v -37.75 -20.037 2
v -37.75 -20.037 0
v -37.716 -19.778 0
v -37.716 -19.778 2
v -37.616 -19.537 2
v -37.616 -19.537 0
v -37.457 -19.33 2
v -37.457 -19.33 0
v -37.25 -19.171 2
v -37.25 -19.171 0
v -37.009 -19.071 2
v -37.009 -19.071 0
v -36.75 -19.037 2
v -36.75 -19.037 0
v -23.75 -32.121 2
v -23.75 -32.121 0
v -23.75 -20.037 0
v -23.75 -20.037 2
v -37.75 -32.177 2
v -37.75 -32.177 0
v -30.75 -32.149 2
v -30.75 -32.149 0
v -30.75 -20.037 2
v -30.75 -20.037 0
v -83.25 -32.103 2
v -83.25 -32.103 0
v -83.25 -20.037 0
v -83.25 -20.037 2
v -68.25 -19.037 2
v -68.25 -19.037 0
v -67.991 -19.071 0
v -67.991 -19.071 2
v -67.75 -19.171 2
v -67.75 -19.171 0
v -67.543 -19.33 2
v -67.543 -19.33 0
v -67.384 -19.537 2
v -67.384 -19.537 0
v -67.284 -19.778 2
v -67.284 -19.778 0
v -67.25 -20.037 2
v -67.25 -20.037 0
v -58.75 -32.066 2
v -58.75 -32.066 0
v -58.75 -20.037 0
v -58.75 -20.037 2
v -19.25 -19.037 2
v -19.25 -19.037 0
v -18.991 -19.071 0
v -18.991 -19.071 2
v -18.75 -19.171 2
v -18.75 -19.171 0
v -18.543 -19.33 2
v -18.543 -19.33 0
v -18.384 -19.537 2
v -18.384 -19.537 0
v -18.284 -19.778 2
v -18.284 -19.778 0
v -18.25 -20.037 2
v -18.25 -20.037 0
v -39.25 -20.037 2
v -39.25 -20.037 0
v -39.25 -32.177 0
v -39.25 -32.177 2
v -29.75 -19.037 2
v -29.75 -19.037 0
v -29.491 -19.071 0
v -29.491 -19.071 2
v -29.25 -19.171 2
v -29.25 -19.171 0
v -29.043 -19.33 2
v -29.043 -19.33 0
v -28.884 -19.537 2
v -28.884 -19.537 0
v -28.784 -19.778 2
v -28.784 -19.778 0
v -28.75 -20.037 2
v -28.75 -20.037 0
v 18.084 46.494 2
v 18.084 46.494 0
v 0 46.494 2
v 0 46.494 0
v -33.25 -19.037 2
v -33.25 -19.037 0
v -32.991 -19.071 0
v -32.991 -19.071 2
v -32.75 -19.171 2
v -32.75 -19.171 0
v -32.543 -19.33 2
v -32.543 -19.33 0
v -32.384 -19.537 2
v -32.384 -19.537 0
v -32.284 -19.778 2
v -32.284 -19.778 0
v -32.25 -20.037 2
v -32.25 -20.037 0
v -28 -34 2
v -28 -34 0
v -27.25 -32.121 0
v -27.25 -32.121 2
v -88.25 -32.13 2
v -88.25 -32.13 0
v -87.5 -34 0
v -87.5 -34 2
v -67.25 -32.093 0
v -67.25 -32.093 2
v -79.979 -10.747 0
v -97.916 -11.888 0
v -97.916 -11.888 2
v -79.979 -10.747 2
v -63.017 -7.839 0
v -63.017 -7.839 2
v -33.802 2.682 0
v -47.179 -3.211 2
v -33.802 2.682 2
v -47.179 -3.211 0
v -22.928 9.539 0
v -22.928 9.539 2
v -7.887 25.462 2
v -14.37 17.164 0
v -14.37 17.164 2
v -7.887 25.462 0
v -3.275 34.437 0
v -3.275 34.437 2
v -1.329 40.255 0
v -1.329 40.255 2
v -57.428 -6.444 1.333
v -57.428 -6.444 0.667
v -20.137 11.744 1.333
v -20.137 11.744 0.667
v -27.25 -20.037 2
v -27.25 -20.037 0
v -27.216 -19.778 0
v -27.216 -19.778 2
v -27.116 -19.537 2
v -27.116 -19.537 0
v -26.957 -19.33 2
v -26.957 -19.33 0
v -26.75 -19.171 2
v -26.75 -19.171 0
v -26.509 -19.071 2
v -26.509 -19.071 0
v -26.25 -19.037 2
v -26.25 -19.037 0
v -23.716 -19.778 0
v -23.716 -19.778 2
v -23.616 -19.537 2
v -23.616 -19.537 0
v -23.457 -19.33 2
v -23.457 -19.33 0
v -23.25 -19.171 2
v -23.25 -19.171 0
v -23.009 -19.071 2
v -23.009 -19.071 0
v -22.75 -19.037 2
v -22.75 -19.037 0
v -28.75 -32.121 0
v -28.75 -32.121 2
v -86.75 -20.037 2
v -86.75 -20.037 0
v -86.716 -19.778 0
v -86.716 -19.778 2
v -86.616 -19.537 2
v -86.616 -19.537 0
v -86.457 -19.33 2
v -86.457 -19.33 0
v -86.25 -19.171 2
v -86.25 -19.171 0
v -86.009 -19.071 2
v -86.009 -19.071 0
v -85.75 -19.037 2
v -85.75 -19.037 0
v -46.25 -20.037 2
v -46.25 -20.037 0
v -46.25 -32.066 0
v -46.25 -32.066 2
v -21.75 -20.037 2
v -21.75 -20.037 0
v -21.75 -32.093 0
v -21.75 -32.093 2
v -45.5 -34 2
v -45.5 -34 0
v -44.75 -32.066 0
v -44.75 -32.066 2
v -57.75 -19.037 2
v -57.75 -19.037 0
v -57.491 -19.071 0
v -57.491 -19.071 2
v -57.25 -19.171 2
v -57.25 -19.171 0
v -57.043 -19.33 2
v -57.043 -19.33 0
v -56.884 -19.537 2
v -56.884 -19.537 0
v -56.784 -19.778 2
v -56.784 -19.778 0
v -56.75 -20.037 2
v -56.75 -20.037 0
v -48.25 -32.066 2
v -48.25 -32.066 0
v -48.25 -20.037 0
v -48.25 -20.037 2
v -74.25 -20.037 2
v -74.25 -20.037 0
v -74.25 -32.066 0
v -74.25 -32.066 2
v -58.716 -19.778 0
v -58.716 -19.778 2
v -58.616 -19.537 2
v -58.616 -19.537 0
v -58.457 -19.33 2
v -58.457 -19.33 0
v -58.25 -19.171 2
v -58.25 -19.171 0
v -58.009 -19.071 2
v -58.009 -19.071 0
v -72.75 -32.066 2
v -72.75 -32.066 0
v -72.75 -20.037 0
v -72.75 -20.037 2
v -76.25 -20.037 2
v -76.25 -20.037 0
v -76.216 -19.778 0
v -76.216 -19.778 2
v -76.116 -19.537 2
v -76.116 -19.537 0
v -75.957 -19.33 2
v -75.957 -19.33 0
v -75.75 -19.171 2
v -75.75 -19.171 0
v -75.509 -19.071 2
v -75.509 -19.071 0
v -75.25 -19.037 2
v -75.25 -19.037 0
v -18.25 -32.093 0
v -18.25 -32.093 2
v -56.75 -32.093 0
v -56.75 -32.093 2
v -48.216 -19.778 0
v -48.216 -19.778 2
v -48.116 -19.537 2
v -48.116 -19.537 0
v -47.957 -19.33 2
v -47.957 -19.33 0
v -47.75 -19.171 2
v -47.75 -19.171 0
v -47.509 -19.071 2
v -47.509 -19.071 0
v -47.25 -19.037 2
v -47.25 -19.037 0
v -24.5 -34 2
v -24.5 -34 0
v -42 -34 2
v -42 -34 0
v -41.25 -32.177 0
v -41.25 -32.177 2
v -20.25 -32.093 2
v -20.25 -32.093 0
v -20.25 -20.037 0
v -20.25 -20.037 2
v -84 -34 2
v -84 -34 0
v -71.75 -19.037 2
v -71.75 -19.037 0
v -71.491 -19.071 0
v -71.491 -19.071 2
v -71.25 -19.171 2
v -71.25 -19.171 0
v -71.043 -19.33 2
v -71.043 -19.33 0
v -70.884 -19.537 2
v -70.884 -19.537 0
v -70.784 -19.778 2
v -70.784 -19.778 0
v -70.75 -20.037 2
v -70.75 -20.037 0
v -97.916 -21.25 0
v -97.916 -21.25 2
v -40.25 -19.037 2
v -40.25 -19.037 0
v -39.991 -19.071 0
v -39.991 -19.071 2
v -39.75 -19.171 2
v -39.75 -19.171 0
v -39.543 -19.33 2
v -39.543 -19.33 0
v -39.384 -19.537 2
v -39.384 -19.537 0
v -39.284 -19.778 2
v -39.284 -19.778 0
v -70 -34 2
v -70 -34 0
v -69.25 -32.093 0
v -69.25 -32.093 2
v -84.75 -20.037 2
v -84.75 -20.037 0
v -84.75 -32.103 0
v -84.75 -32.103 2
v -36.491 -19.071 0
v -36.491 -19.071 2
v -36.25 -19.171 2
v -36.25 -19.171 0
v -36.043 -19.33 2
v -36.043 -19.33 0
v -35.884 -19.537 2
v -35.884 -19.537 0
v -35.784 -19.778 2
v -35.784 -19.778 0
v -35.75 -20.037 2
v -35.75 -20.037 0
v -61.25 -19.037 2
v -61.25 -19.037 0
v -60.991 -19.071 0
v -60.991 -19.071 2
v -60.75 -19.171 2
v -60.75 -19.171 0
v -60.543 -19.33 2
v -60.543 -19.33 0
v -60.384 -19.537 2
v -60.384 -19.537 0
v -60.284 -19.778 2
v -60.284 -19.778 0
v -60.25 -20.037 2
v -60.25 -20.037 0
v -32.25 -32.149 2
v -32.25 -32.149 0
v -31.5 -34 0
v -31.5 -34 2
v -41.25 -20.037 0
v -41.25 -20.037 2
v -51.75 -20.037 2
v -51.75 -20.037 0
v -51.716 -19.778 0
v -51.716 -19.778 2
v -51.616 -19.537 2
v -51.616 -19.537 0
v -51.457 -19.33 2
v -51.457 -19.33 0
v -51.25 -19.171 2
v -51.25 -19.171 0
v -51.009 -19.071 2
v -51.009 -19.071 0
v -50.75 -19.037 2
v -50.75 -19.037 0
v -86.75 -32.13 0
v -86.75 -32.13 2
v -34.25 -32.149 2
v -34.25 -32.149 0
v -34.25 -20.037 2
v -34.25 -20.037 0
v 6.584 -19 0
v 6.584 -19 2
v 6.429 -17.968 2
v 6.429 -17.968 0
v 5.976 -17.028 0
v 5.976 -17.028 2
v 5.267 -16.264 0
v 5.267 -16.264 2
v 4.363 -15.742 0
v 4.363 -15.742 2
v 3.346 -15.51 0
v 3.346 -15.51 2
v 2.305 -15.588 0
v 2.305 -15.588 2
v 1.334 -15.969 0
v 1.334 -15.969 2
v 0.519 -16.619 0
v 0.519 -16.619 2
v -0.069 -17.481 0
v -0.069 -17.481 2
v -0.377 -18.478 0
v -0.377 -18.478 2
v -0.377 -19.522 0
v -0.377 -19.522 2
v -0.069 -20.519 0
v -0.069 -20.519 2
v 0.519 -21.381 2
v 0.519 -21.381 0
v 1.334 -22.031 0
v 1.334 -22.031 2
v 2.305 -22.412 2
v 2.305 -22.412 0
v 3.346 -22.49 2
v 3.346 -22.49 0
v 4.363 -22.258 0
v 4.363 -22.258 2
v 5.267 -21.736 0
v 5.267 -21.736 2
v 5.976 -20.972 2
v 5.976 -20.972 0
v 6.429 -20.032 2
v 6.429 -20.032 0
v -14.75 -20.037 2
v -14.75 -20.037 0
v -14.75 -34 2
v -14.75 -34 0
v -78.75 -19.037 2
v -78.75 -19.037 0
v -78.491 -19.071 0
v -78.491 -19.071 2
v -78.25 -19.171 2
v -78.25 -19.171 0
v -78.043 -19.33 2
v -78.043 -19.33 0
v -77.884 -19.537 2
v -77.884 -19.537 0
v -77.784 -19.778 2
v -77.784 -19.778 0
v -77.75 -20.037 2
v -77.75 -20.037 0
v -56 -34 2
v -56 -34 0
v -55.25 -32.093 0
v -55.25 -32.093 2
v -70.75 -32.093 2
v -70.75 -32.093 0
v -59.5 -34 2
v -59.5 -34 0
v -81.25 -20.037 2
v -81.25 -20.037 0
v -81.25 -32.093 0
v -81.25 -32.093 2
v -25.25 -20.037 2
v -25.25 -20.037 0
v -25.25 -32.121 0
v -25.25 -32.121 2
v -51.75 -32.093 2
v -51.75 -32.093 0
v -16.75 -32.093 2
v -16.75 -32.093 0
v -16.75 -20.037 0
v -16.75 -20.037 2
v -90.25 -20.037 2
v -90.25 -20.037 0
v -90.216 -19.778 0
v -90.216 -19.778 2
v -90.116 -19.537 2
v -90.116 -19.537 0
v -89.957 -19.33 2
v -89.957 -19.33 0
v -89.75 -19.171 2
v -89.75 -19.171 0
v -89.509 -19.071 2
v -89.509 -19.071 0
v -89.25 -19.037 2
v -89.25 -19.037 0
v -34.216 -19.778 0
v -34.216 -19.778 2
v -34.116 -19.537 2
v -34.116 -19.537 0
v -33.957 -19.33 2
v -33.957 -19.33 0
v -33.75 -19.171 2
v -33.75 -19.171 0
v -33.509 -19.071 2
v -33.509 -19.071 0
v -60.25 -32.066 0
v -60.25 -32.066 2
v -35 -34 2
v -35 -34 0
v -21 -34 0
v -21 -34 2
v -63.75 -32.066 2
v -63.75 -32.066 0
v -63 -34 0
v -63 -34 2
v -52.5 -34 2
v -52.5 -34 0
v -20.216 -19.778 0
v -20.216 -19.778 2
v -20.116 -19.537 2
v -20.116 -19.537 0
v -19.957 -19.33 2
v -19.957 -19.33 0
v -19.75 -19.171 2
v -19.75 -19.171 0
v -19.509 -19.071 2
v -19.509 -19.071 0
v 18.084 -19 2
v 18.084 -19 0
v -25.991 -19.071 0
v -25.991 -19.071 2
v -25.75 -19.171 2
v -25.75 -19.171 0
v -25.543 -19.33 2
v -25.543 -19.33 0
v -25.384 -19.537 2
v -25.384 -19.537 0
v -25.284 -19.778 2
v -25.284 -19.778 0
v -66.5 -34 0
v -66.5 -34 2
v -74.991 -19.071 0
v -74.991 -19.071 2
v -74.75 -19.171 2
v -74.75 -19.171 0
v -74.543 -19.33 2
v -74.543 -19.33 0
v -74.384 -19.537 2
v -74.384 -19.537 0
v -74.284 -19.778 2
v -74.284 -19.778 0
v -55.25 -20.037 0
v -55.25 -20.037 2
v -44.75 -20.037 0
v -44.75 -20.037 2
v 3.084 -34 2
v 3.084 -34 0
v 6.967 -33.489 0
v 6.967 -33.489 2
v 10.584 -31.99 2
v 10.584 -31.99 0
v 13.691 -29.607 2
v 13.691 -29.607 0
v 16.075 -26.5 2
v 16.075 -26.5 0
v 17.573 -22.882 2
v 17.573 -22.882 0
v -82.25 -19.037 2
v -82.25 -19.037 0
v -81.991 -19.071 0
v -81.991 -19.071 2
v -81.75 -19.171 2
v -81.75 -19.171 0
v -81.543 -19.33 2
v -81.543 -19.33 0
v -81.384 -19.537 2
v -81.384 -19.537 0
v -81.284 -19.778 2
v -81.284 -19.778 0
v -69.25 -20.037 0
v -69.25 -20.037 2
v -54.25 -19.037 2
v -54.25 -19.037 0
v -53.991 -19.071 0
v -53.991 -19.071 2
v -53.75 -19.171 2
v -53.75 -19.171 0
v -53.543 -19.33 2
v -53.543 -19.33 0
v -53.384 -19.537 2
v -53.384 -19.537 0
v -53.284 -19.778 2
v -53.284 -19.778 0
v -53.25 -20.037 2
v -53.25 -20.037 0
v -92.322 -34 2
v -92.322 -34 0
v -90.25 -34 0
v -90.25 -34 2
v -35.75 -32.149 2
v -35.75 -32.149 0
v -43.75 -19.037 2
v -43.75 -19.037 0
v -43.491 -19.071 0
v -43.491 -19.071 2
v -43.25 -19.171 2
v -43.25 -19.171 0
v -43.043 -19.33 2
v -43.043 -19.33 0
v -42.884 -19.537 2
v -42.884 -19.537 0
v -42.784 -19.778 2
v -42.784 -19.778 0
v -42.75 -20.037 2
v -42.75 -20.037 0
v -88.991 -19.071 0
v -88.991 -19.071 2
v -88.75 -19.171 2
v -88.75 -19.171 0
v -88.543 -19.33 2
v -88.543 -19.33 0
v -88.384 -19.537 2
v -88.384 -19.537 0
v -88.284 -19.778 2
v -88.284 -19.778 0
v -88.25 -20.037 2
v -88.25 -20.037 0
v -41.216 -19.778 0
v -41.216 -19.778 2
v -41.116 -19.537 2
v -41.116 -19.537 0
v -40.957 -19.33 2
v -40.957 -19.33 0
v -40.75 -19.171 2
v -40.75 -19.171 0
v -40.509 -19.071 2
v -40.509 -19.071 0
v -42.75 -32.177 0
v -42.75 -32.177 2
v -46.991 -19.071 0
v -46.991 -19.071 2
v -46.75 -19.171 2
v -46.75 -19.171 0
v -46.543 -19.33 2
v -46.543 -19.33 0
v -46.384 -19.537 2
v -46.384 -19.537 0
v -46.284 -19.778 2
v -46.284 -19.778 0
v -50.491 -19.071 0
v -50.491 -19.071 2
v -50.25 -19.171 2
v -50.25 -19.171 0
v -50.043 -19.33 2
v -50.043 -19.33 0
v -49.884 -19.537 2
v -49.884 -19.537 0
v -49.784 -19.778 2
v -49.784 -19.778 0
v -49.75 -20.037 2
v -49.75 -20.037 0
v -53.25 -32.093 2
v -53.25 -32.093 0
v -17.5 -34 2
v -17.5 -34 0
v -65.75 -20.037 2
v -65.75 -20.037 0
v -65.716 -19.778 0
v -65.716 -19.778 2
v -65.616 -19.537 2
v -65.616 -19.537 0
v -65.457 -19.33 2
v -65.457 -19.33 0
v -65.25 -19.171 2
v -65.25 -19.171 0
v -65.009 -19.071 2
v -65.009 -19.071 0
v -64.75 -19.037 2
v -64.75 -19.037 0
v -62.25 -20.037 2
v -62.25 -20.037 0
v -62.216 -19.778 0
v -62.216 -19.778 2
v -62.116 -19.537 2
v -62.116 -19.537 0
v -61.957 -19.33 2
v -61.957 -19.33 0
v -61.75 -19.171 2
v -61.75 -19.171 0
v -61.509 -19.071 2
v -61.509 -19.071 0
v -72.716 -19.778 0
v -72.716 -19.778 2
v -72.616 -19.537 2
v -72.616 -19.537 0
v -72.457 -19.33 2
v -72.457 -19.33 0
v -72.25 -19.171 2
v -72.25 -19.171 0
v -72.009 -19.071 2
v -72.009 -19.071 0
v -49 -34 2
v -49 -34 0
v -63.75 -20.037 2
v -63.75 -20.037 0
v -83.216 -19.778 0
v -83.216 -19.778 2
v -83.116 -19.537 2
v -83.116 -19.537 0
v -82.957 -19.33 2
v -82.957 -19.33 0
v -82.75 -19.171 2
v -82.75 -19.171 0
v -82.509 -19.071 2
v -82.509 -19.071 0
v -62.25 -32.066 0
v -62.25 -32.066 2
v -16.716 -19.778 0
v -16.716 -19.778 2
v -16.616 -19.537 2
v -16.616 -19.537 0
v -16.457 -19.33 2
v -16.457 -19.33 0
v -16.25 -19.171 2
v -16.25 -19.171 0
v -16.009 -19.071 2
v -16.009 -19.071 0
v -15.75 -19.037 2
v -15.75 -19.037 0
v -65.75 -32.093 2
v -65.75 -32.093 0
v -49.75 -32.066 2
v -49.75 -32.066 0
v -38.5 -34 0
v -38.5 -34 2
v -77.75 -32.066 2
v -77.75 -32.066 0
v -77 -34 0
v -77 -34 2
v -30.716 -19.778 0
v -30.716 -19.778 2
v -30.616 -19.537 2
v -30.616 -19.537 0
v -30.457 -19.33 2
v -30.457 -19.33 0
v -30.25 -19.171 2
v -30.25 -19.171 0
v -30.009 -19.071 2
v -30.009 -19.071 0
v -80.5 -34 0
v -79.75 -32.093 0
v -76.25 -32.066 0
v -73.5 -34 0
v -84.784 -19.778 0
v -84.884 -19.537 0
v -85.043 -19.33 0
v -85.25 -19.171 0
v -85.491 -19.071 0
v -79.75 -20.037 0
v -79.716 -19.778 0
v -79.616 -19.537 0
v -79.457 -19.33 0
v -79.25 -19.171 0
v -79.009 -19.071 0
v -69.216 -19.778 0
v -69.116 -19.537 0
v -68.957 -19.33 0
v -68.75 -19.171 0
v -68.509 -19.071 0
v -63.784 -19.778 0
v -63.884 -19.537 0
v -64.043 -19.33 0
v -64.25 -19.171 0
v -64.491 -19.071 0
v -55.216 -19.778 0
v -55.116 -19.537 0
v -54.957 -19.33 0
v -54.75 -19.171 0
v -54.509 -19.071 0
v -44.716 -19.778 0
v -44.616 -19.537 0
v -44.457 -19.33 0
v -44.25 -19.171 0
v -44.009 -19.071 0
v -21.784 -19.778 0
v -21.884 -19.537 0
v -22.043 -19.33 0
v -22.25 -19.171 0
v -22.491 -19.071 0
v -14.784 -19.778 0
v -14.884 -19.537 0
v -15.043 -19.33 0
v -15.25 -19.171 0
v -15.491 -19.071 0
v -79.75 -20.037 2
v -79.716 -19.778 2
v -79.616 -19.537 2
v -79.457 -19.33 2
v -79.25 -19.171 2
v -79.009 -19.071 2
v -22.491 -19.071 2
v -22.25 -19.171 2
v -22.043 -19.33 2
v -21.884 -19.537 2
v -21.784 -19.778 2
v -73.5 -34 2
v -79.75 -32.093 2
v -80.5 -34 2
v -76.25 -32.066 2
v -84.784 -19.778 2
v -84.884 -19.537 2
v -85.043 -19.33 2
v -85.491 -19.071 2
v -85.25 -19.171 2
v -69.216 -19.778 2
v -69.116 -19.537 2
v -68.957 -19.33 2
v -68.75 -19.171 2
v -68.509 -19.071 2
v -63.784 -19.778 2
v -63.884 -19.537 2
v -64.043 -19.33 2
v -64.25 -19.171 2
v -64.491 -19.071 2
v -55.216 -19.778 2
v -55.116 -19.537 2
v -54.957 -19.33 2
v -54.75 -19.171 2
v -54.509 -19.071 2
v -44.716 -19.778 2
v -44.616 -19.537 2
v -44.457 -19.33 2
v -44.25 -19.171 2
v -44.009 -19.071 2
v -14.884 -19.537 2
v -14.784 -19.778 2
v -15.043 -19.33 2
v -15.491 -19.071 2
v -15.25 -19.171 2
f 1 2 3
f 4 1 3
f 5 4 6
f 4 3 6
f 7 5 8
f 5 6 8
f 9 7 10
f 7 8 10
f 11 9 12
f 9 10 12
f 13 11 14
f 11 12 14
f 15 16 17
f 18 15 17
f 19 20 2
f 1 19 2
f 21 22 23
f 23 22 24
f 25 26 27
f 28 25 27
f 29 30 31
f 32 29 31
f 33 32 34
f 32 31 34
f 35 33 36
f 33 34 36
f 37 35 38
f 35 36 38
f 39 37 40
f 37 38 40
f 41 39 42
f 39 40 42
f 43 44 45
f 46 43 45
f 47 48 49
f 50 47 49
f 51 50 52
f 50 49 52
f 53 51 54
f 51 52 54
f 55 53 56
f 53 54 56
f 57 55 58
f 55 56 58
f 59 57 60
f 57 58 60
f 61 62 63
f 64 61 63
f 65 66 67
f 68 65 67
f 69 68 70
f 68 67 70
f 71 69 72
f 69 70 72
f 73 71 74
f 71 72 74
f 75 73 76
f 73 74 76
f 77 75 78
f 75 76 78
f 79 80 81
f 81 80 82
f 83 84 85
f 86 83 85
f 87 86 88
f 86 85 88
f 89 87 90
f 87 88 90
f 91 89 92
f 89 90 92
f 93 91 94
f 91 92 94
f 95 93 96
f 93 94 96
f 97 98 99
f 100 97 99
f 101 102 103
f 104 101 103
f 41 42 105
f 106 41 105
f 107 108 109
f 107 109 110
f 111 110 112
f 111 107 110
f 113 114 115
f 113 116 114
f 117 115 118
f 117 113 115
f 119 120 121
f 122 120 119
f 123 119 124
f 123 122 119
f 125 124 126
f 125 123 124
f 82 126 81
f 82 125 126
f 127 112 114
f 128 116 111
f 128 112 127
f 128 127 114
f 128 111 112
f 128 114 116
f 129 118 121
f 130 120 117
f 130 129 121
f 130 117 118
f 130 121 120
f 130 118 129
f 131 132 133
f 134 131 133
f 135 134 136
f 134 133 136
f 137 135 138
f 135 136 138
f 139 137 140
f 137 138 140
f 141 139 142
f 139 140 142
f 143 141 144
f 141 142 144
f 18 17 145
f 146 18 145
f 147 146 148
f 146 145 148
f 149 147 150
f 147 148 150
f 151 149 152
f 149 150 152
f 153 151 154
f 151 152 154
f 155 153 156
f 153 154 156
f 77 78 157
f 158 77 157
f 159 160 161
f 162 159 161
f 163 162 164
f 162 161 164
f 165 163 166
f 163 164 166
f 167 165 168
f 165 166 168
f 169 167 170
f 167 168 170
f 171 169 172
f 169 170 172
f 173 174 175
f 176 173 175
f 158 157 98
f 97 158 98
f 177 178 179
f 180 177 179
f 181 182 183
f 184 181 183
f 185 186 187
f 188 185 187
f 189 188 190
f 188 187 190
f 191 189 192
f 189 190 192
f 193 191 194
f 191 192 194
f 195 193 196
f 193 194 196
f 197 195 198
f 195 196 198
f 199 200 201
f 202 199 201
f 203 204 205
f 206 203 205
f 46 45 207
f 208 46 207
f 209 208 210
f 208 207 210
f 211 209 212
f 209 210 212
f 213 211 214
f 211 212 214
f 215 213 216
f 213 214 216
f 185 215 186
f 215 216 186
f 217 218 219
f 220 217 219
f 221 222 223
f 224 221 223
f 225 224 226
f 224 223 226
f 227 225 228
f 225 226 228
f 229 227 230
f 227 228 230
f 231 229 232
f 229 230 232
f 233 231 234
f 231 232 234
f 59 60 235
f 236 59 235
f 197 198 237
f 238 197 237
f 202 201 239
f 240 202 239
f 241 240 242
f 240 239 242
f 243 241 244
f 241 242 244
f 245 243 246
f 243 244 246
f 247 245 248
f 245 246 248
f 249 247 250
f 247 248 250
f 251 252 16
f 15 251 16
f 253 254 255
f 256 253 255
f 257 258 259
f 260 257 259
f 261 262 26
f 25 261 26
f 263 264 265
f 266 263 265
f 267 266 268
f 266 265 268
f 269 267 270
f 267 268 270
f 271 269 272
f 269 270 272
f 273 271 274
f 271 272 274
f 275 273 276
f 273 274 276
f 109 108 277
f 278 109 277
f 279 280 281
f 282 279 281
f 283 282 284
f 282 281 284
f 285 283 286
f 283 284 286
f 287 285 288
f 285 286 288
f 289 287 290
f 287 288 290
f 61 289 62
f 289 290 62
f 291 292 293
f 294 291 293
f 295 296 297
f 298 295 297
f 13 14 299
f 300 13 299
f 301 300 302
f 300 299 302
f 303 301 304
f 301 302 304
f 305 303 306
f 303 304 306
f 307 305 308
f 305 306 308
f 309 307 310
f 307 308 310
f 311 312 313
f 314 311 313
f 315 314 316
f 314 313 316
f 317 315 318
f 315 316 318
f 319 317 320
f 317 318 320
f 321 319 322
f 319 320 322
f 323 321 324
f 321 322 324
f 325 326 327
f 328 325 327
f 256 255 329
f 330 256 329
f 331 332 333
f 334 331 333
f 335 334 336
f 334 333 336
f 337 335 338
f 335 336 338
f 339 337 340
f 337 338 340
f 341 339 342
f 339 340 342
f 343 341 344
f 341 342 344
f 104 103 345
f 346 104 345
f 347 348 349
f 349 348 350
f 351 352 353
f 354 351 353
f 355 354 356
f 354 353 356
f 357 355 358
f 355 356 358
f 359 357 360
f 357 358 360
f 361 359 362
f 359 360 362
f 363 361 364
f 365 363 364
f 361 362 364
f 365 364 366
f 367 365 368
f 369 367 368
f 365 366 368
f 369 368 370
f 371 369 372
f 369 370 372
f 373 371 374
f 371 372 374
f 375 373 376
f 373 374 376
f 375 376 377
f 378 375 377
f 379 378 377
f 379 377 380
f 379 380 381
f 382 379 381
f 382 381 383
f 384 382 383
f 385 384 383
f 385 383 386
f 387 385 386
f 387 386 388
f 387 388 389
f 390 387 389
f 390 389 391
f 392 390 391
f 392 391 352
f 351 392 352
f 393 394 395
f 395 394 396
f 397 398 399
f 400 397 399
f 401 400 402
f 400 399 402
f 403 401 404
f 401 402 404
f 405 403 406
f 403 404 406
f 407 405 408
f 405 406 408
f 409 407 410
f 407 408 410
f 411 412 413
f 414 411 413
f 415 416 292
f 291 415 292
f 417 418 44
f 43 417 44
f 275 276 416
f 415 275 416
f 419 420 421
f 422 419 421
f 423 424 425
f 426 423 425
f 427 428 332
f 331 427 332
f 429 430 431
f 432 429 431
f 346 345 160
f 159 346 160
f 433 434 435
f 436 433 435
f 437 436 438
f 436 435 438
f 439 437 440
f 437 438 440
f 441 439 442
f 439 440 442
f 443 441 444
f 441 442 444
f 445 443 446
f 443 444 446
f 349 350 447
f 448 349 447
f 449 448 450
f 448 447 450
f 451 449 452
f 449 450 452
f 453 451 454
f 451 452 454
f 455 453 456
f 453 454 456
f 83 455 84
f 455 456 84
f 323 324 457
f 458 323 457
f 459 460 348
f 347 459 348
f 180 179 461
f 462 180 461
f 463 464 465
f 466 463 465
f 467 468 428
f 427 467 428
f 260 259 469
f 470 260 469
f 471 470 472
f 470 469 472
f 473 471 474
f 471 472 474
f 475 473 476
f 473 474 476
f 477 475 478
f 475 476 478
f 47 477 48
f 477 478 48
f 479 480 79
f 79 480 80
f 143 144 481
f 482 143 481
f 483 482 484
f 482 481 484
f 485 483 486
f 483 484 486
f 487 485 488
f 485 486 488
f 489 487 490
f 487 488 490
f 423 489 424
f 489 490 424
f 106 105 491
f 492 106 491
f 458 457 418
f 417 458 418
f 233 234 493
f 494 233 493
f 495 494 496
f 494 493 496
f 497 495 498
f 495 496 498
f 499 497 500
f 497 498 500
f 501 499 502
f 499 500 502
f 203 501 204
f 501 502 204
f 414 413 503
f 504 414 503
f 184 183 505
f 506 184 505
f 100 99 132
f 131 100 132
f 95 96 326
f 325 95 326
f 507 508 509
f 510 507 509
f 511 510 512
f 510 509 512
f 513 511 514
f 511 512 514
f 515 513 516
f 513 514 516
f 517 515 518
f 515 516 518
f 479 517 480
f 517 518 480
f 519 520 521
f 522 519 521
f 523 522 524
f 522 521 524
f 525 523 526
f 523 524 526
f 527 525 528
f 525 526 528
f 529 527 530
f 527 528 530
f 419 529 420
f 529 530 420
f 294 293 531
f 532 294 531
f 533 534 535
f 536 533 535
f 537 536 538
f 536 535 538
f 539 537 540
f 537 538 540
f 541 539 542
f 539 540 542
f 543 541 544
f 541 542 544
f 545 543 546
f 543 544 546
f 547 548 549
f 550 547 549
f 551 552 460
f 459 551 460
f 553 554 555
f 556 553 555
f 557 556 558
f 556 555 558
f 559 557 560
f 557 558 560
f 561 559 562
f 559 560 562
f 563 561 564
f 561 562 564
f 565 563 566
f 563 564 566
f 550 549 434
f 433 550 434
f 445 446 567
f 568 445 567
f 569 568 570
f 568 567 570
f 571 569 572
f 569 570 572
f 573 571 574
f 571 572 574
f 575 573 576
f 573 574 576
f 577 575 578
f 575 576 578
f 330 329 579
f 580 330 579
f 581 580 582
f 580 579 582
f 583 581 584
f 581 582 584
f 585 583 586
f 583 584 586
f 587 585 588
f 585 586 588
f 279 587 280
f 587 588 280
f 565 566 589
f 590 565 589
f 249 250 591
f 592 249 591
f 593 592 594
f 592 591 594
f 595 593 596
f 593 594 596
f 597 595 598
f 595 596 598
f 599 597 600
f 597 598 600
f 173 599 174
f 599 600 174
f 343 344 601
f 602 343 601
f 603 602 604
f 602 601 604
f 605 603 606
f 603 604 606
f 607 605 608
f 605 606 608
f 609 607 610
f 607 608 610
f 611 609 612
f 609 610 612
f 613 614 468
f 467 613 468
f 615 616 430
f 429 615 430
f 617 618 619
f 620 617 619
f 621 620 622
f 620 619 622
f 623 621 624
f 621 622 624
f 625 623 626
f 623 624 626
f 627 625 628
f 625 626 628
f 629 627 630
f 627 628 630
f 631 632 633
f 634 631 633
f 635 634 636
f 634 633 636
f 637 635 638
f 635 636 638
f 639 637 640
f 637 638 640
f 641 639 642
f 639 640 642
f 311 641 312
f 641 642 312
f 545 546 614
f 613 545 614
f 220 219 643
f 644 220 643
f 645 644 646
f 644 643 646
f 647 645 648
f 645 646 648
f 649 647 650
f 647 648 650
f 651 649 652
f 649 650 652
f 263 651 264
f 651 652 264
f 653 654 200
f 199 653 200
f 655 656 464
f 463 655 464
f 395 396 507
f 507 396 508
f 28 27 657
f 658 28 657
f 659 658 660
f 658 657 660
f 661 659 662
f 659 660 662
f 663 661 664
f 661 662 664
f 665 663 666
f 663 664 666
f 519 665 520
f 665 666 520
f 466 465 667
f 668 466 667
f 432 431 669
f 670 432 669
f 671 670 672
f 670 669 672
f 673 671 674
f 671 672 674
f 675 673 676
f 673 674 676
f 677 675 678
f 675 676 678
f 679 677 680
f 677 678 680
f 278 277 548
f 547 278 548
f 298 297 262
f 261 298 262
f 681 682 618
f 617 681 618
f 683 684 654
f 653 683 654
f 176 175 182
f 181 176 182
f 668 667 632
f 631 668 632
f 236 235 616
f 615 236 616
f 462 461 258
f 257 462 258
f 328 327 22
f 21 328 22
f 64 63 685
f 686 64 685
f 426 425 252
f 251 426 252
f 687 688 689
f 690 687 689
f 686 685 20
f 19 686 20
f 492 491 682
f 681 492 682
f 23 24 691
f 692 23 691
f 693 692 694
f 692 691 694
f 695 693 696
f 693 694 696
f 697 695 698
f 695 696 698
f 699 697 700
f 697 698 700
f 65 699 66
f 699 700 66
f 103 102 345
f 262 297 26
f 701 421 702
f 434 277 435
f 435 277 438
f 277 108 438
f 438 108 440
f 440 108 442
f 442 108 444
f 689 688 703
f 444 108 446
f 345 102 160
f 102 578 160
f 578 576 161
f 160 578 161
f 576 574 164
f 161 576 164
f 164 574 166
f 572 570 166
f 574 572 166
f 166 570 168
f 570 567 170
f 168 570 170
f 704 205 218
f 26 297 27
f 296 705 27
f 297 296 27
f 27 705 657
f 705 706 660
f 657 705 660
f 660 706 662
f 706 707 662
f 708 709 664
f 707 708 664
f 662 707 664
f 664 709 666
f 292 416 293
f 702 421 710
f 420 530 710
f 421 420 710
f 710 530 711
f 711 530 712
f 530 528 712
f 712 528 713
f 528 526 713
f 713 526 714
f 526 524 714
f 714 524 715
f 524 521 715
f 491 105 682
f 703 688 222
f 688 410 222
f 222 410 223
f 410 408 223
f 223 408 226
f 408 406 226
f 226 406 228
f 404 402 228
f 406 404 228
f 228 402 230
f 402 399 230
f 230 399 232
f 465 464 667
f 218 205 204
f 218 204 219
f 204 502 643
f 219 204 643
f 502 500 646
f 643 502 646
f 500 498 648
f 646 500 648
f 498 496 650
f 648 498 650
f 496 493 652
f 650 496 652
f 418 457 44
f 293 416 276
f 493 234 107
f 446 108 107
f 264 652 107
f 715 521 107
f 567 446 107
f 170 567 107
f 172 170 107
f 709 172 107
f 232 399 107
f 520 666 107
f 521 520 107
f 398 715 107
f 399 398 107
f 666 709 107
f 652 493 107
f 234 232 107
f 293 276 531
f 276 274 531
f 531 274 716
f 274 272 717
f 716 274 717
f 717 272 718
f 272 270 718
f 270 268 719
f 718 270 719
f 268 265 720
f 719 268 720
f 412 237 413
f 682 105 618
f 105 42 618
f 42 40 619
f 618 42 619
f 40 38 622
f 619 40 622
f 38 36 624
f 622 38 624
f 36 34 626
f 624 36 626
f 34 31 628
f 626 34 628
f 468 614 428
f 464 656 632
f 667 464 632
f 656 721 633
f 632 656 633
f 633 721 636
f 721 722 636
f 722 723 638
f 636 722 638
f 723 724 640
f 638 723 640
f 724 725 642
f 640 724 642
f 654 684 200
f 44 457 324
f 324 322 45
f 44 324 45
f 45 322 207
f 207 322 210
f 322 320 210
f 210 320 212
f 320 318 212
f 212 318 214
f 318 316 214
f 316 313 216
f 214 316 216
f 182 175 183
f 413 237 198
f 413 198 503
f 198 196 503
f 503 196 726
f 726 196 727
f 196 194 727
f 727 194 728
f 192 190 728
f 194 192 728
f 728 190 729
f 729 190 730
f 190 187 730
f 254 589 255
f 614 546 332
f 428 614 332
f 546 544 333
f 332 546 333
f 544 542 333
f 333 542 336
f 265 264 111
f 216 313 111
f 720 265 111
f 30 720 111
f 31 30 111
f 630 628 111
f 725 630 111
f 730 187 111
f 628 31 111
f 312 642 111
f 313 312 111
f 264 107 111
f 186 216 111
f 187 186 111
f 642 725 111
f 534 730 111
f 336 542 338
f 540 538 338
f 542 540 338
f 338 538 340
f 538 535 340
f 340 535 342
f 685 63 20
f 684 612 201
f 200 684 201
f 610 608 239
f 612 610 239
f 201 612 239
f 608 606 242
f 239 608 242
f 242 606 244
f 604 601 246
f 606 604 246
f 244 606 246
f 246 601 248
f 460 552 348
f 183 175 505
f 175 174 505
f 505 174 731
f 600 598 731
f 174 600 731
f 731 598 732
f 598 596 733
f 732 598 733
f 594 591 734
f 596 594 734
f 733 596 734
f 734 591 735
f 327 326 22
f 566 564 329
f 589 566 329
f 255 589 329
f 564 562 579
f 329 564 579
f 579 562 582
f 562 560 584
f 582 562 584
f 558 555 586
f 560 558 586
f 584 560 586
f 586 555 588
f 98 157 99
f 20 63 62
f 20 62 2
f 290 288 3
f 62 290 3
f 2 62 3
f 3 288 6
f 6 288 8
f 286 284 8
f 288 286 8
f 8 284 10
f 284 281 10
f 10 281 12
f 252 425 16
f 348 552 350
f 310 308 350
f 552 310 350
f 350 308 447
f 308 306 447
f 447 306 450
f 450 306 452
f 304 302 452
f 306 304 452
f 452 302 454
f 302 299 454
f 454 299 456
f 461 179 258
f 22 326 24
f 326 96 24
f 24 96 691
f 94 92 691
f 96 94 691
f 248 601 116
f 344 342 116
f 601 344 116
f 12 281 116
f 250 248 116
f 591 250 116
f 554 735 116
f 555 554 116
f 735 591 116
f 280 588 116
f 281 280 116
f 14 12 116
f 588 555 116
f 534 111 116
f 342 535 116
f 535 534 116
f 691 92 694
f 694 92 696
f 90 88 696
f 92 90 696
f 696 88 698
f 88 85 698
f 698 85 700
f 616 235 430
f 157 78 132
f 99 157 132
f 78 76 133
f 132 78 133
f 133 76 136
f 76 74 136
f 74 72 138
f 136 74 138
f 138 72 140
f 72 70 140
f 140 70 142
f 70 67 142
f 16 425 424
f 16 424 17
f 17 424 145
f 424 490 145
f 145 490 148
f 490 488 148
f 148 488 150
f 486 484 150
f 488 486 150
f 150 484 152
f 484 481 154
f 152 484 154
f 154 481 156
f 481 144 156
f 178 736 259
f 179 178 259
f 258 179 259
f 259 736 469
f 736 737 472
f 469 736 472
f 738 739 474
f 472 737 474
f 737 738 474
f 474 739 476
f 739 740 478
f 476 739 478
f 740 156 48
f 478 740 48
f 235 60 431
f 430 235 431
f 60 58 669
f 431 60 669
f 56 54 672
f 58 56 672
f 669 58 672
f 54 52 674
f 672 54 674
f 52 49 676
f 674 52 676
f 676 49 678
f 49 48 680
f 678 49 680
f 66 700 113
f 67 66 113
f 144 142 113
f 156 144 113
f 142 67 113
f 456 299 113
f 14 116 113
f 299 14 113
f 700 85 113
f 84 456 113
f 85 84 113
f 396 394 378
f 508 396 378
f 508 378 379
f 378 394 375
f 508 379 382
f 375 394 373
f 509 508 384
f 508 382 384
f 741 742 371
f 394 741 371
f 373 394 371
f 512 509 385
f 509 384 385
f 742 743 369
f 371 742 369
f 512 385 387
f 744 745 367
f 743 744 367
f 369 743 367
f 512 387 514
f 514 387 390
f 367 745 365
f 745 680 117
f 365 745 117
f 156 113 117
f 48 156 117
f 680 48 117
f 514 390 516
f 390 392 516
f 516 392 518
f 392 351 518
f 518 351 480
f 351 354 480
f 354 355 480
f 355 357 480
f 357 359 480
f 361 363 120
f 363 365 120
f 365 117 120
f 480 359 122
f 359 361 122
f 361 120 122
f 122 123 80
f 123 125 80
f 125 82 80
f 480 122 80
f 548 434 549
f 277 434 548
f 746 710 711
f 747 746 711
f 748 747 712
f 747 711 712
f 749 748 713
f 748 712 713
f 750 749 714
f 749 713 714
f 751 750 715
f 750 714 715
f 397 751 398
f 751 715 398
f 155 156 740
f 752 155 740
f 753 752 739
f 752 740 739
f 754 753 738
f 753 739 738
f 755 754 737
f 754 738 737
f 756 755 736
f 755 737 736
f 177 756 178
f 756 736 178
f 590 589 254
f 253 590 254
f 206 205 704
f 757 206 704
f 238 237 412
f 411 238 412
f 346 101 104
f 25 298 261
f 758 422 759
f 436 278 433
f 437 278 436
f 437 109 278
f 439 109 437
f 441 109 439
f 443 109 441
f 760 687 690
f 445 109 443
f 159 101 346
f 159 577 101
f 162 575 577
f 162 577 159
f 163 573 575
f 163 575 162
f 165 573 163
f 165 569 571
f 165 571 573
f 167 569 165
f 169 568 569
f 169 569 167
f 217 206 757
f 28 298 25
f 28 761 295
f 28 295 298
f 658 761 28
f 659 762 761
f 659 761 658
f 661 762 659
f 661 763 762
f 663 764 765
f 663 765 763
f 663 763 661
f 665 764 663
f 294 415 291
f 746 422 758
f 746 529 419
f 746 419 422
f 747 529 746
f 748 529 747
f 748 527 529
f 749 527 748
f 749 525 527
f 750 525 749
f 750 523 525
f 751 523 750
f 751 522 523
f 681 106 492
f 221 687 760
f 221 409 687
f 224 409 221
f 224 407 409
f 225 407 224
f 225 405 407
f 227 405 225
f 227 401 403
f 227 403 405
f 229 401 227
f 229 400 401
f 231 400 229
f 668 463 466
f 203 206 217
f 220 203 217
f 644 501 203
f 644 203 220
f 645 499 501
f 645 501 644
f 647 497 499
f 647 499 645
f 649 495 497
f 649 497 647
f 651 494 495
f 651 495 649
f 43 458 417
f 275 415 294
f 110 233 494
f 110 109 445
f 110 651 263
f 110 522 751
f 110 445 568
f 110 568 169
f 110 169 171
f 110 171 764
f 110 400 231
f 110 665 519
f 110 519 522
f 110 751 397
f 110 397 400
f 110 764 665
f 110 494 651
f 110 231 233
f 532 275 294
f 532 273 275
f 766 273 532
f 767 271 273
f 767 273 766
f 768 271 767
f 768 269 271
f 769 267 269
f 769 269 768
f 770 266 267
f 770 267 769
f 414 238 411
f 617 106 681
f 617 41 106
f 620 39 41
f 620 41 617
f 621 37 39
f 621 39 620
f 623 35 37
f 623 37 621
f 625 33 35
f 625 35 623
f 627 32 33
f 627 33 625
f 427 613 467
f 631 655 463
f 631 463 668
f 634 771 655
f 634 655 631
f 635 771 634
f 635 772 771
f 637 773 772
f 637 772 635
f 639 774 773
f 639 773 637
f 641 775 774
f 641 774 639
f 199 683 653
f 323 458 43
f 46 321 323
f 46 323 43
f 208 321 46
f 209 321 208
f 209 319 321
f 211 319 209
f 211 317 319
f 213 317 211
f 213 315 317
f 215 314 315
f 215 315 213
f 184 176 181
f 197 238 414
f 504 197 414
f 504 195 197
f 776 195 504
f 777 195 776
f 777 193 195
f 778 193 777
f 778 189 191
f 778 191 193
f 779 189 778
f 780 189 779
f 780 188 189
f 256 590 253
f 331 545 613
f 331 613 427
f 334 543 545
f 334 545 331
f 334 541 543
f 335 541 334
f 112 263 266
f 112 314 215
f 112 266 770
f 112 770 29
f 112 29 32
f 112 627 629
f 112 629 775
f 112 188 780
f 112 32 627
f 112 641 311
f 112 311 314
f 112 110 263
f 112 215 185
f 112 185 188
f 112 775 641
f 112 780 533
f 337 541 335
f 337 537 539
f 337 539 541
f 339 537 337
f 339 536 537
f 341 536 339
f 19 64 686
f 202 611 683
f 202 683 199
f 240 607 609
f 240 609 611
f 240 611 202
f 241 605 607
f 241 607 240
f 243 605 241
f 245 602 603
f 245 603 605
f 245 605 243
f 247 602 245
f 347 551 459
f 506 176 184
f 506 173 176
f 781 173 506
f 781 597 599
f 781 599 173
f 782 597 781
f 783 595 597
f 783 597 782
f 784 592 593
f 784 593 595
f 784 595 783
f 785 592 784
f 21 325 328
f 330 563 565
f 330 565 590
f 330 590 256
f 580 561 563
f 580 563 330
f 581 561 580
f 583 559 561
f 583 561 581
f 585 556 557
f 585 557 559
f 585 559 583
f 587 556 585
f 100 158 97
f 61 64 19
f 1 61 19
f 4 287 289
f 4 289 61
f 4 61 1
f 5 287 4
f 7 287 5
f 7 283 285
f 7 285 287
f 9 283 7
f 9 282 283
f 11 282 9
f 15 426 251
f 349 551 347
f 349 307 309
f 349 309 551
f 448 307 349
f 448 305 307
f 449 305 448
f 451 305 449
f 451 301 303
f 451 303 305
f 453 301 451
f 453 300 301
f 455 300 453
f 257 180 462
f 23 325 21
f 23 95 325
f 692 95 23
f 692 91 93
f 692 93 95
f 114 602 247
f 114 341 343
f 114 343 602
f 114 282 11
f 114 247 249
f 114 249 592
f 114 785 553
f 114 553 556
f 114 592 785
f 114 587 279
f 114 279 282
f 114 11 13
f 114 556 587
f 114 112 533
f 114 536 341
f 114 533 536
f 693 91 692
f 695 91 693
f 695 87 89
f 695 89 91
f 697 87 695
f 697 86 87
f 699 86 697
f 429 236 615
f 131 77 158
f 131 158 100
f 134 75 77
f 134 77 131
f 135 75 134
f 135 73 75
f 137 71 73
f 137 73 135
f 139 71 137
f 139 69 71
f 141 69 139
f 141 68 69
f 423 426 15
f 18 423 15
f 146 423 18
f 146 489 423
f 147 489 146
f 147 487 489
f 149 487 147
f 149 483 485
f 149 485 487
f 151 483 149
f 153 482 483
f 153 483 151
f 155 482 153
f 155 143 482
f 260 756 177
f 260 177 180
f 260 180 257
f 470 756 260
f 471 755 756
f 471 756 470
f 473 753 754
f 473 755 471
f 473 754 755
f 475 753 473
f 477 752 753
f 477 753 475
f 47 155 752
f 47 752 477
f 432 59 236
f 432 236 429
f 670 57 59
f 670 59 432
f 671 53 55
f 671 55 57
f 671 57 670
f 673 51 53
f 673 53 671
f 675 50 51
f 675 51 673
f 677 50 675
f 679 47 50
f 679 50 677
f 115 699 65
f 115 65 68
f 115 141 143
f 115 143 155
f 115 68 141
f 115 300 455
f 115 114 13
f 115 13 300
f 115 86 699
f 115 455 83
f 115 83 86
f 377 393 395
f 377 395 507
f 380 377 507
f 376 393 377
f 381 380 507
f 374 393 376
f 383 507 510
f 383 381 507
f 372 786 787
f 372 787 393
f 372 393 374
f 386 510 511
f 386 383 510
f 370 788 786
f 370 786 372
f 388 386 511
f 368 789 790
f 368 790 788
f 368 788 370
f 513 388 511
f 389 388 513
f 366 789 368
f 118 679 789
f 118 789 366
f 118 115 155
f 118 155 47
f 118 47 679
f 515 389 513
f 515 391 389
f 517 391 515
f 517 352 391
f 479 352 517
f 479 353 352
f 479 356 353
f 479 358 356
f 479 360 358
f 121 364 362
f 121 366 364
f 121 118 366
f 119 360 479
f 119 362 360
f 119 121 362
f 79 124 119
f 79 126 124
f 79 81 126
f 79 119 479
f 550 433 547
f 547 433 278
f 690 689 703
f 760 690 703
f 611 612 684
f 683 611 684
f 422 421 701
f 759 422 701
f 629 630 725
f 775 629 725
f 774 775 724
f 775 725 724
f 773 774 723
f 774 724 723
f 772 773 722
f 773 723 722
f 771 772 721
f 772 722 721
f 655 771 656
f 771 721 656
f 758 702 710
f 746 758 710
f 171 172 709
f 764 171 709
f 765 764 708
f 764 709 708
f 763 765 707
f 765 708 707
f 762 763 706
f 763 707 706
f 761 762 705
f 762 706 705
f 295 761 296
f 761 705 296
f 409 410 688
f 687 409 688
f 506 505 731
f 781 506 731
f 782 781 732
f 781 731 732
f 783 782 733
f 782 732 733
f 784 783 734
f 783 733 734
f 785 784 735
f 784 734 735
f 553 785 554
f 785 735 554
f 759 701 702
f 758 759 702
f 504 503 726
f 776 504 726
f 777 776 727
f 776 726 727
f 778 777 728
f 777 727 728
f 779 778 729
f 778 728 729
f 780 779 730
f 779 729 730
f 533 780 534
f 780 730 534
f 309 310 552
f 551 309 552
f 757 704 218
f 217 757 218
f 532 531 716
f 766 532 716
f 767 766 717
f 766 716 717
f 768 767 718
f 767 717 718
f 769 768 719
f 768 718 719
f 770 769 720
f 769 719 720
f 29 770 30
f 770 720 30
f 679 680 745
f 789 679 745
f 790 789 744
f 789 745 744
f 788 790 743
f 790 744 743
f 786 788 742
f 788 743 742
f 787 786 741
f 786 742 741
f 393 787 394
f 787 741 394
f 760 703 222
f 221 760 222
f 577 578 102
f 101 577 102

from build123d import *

# Parameters (mm, degrees)
F1_DEPTH = 2
F2_R     = 3.5
F3_DEPTH = 25


# Not quite as in the source:
# - a feature names something its author has since deleted; it is built from what else it names


with BuildPart() as f1:
    # F0 (on Top) → F1 (new body)
    with BuildSketch(Plane.XY):
        with BuildLine():
            ThreePointArc((-15.75, -19.0369902551), (-15.0428932188, -19.3298834739), (-14.75, -20.0369902551))
            Line((-14.75, -20.0369902551), (-14.75, -34))
            Line((-14.75, -34), (3.0843058825, -34))
            ThreePointArc((3.0843058825, -34), (13.6909076003, -29.6066017178), (18.0843058825, -19))
            Line((18.0843058825, -19), (18.0843058825, 46.4938916266))
            Line((18.0843058825, 46.4938916266), (0, 46.4938916266))
            add(Edge.make_bspline(
                [(-97.9156941175, -11.8882479146), (-60.4824349284, -11.5448236465), (-6.9082397968, 2.1921501029), (0, 46.4938916266)],
                knots=[0, 0, 0, 0, 113.9998130346, 113.9998130346, 113.9998130346, 113.9998130346], degree=3))
            Line((-97.9156941175, -11.8882479146), (-97.9156941175, -21.2501913908))
            Line((-97.9156941175, -21.2501913908), (-92.3223271966, -34))
            Line((-92.3223271966, -34), (-90.25, -34))
            Line((-90.25, -34), (-90.25, -32.1302767694))
            Line((-90.25, -32.1302767694), (-90.25, -20.0369902551))
            ThreePointArc((-90.25, -20.0369902551), (-89.9571067812, -19.3298834739), (-89.25, -19.0369902551))
            ThreePointArc((-89.25, -19.0369902551), (-88.5428932188, -19.3298834739), (-88.25, -20.0369902551))
            Line((-88.25, -20.0369902551), (-88.25, -32.1302767694))
            Line((-88.25, -32.1302767694), (-87.5, -34))
            Line((-87.5, -34), (-86.75, -32.1302767694))
            Line((-86.75, -32.1302767694), (-86.75, -20.0369902551))
            ThreePointArc((-86.75, -20.0369902551), (-86.4571067812, -19.3298834739), (-85.75, -19.0369902551))
            ThreePointArc((-85.75, -19.0369902551), (-85.0428932188, -19.3298834739), (-84.75, -20.0369902551))
            Line((-84.75, -20.0369902551), (-84.75, -32.1025866866))
            Line((-84.75, -32.1025866866), (-84, -34))
            Line((-84, -34), (-83.25, -32.1025866866))
            Line((-83.25, -32.1025866866), (-83.25, -20.0369902551))
            ThreePointArc((-83.25, -20.0369902551), (-82.9571067812, -19.3298834739), (-82.25, -19.0369902551))
            ThreePointArc((-82.25, -19.0369902551), (-81.5428932188, -19.3298834739), (-81.25, -20.0369902551))
            Line((-81.25, -20.0369902551), (-81.25, -32.0932865143))
            Line((-81.25, -32.0932865143), (-80.5, -34))
            Line((-80.5, -34), (-79.75, -32.0932865143))
            Line((-79.75, -32.0932865143), (-79.75, -20.0369902551))
            ThreePointArc((-79.75, -20.0369902551), (-79.4571067812, -19.3298834739), (-78.75, -19.0369902551))
            ThreePointArc((-78.75, -19.0369902551), (-78.0428932188, -19.3298834739), (-77.75, -20.0369902551))
            Line((-77.75, -20.0369902551), (-77.75, -32.0655964315))
            Line((-77.75, -32.0655964315), (-77, -34))
            Line((-77, -34), (-76.25, -32.0655964315))
            Line((-76.25, -32.0655964315), (-76.25, -20.0369902551))
            ThreePointArc((-76.25, -20.0369902551), (-75.9571067812, -19.3298834739), (-75.25, -19.0369902551))
            ThreePointArc((-75.25, -19.0369902551), (-74.5428932188, -19.3298834739), (-74.25, -20.0369902551))
            Line((-74.25, -20.0369902551), (-74.25, -32.0655964315))
            Line((-74.25, -32.0655964315), (-73.5, -34))
            Line((-73.5, -34), (-72.75, -32.0655964315))
            Line((-72.75, -32.0655964315), (-72.75, -20.0369902551))
            ThreePointArc((-72.75, -20.0369902551), (-72.4571067812, -19.3298834739), (-71.75, -19.0369902551))
            ThreePointArc((-71.75, -19.0369902551), (-71.0428932188, -19.3298834739), (-70.75, -20.0369902551))
            Line((-70.75, -20.0369902551), (-70.75, -32.0932865143))
            Line((-70.75, -32.0932865143), (-70, -34))
            Line((-70, -34), (-69.25, -32.0932865143))
            Line((-69.25, -32.0932865143), (-69.25, -20.0369902551))
            ThreePointArc((-69.25, -20.0369902551), (-68.9571067812, -19.3298834739), (-68.25, -19.0369902551))
            ThreePointArc((-68.25, -19.0369902551), (-67.5428932188, -19.3298834739), (-67.25, -20.0369902551))
            Line((-67.25, -20.0369902551), (-67.25, -32.0932865143))
            Line((-67.25, -32.0932865143), (-66.5, -34))
            Line((-66.5, -34), (-65.75, -32.0932865143))
            Line((-65.75, -32.0932865143), (-65.75, -20.0369902551))
            ThreePointArc((-65.75, -20.0369902551), (-65.4571067812, -19.3298834739), (-64.75, -19.0369902551))
            ThreePointArc((-64.75, -19.0369902551), (-64.0428932188, -19.3298834739), (-63.75, -20.0369902551))
            Line((-63.75, -20.0369902551), (-63.75, -32.0655964315))
            Line((-63.75, -32.0655964315), (-63, -34))
            Line((-63, -34), (-62.25, -32.0655964315))
            Line((-62.25, -32.0655964315), (-62.25, -20.0369902551))
            ThreePointArc((-62.25, -20.0369902551), (-61.9571067812, -19.3298834739), (-61.25, -19.0369902551))
            ThreePointArc((-61.25, -19.0369902551), (-60.5428932188, -19.3298834739), (-60.25, -20.0369902551))
            Line((-60.25, -20.0369902551), (-60.25, -32.0655964315))
            Line((-60.25, -32.0655964315), (-59.5, -34))
            Line((-59.5, -34), (-58.75, -32.0655964315))
            Line((-58.75, -32.0655964315), (-58.75, -20.0369902551))
            ThreePointArc((-58.75, -20.0369902551), (-58.4571067812, -19.3298834739), (-57.75, -19.0369902551))
            ThreePointArc((-57.75, -19.0369902551), (-57.0428932188, -19.3298834739), (-56.75, -20.0369902551))
            Line((-56.75, -20.0369902551), (-56.75, -32.0932865143))
            Line((-56.75, -32.0932865143), (-56, -34))
            Line((-56, -34), (-55.25, -32.0932865143))
            Line((-55.25, -32.0932865143), (-55.25, -20.0369902551))
            ThreePointArc((-55.25, -20.0369902551), (-54.9571067812, -19.3298834739), (-54.25, -19.0369902551))
            ThreePointArc((-54.25, -19.0369902551), (-53.5428932188, -19.3298834739), (-53.25, -20.0369902551))
            Line((-53.25, -20.0369902551), (-53.25, -32.0932865143))
            Line((-53.25, -32.0932865143), (-52.5, -34))
            Line((-52.5, -34), (-51.75, -32.0932865143))
            Line((-51.75, -32.0932865143), (-51.75, -20.0369902551))
            ThreePointArc((-51.75, -20.0369902551), (-51.4571067812, -19.3298834739), (-50.75, -19.0369902551))
            ThreePointArc((-50.75, -19.0369902551), (-50.0428932188, -19.3298834739), (-49.75, -20.0369902551))
            Line((-49.75, -20.0369902551), (-49.75, -32.0655964315))
            Line((-49.75, -32.0655964315), (-49, -34))
            Line((-49, -34), (-48.25, -32.0655964315))
            Line((-48.25, -32.0655964315), (-48.25, -20.0369902551))
            ThreePointArc((-48.25, -20.0369902551), (-47.9571067812, -19.3298834739), (-47.25, -19.0369902551))
            ThreePointArc((-47.25, -19.0369902551), (-46.5428932188, -19.3298834739), (-46.25, -20.0369902551))
            Line((-46.25, -20.0369902551), (-46.25, -32.0655964315))
            Line((-46.25, -32.0655964315), (-45.5, -34))
            Line((-45.5, -34), (-44.75, -32.0655964315))
            Line((-44.75, -32.0655964315), (-44.75, -20.0369902551))
            ThreePointArc((-44.75, -20.0369902551), (-44.4571067812, -19.3298834739), (-43.75, -19.0369902551))
            ThreePointArc((-43.75, -19.0369902551), (-43.0428932188, -19.3298834739), (-42.75, -20.0369902551))
            Line((-42.75, -20.0369902551), (-42.75, -32.176785171))
            Line((-42.75, -32.176785171), (-42, -34))
            Line((-42, -34), (-41.25, -32.176785171))
            Line((-41.25, -32.176785171), (-41.25, -20.0369902551))
            ThreePointArc((-41.25, -20.0369902551), (-40.9571067812, -19.3298834739), (-40.25, -19.0369902551))
            ThreePointArc((-40.25, -19.0369902551), (-39.5428932188, -19.3298834739), (-39.25, -20.0369902551))
            Line((-39.25, -20.0369902551), (-39.25, -32.176785171))
            Line((-39.25, -32.176785171), (-38.5, -34))
            Line((-38.5, -34), (-37.75, -32.176785171))
            Line((-37.75, -32.176785171), (-37.75, -20.0369902551))
            ThreePointArc((-37.75, -20.0369902551), (-37.4571067812, -19.3298834739), (-36.75, -19.0369902551))
            ThreePointArc((-36.75, -19.0369902551), (-36.0428932188, -19.3298834739), (-35.75, -20.0369902551))
            Line((-35.75, -20.0369902551), (-35.75, -32.1490950882))
            Line((-35.75, -32.1490950882), (-35, -34))
            Line((-35, -34), (-34.25, -32.1490950882))
            Line((-34.25, -32.1490950882), (-34.25, -20.0369902551))
            ThreePointArc((-34.25, -20.0369902551), (-33.9571067812, -19.3298834739), (-33.25, -19.0369902551))
            ThreePointArc((-33.25, -19.0369902551), (-32.5428932188, -19.3298834739), (-32.25, -20.0369902551))
            Line((-32.25, -20.0369902551), (-32.25, -32.1490950882))
            Line((-32.25, -32.1490950882), (-31.5, -34))
            Line((-31.5, -34), (-30.75, -32.1490950882))
            Line((-30.75, -32.1490950882), (-30.75, -20.0369902551))
            ThreePointArc((-30.75, -20.0369902551), (-30.4571067812, -19.3298834739), (-29.75, -19.0369902551))
            ThreePointArc((-29.75, -19.0369902551), (-29.0428932188, -19.3298834739), (-28.75, -20.0369902551))
            Line((-28.75, -20.0369902551), (-28.75, -32.1209765971))
            Line((-28.75, -32.1209765971), (-28, -34))
            Line((-28, -34), (-27.25, -32.1209765971))
            Line((-27.25, -32.1209765971), (-27.25, -20.0369902551))
            ThreePointArc((-27.25, -20.0369902551), (-26.9571067812, -19.3298834739), (-26.25, -19.0369902551))
            ThreePointArc((-26.25, -19.0369902551), (-25.5428932188, -19.3298834739), (-25.25, -20.0369902551))
            Line((-25.25, -20.0369902551), (-25.25, -32.1209765971))
            Line((-25.25, -32.1209765971), (-24.5, -34))
            Line((-24.5, -34), (-23.75, -32.1209765971))
            Line((-23.75, -32.1209765971), (-23.75, -20.0369902551))
            ThreePointArc((-23.75, -20.0369902551), (-23.4571067812, -19.3298834739), (-22.75, -19.0369902551))
            ThreePointArc((-22.75, -19.0369902551), (-22.0428932188, -19.3298834739), (-21.75, -20.0369902551))
            Line((-21.75, -20.0369902551), (-21.75, -32.0932865143))
            Line((-21.75, -32.0932865143), (-21, -34))
            Line((-21, -34), (-20.25, -32.0932865143))
            Line((-20.25, -32.0932865143), (-20.25, -20.0369902551))
            ThreePointArc((-20.25, -20.0369902551), (-19.9571067812, -19.3298834739), (-19.25, -19.0369902551))
            ThreePointArc((-19.25, -19.0369902551), (-18.5428932188, -19.3298834739), (-18.25, -20.0369902551))
            Line((-18.25, -20.0369902551), (-18.25, -32.0932865143))
            Line((-18.25, -32.0932865143), (-17.5, -34))
            Line((-17.5, -34), (-16.75, -32.0932865143))
            Line((-16.75, -32.0932865143), (-16.75, -20.0369902551))
            ThreePointArc((-16.75, -20.0369902551), (-16.4571067812, -19.3298834739), (-15.75, -19.0369902551))
        make_face()
    extrude(amount=F1_DEPTH)

    # F2 (on face) → F3 (cut)
    with BuildSketch(Plane.XY.offset(2)):
        with Locations((3.0843058825, -19)):
            Circle(F2_R)
    extrude(amount=-F3_DEPTH, mode=Mode.SUBTRACT)


solid = f1.part
